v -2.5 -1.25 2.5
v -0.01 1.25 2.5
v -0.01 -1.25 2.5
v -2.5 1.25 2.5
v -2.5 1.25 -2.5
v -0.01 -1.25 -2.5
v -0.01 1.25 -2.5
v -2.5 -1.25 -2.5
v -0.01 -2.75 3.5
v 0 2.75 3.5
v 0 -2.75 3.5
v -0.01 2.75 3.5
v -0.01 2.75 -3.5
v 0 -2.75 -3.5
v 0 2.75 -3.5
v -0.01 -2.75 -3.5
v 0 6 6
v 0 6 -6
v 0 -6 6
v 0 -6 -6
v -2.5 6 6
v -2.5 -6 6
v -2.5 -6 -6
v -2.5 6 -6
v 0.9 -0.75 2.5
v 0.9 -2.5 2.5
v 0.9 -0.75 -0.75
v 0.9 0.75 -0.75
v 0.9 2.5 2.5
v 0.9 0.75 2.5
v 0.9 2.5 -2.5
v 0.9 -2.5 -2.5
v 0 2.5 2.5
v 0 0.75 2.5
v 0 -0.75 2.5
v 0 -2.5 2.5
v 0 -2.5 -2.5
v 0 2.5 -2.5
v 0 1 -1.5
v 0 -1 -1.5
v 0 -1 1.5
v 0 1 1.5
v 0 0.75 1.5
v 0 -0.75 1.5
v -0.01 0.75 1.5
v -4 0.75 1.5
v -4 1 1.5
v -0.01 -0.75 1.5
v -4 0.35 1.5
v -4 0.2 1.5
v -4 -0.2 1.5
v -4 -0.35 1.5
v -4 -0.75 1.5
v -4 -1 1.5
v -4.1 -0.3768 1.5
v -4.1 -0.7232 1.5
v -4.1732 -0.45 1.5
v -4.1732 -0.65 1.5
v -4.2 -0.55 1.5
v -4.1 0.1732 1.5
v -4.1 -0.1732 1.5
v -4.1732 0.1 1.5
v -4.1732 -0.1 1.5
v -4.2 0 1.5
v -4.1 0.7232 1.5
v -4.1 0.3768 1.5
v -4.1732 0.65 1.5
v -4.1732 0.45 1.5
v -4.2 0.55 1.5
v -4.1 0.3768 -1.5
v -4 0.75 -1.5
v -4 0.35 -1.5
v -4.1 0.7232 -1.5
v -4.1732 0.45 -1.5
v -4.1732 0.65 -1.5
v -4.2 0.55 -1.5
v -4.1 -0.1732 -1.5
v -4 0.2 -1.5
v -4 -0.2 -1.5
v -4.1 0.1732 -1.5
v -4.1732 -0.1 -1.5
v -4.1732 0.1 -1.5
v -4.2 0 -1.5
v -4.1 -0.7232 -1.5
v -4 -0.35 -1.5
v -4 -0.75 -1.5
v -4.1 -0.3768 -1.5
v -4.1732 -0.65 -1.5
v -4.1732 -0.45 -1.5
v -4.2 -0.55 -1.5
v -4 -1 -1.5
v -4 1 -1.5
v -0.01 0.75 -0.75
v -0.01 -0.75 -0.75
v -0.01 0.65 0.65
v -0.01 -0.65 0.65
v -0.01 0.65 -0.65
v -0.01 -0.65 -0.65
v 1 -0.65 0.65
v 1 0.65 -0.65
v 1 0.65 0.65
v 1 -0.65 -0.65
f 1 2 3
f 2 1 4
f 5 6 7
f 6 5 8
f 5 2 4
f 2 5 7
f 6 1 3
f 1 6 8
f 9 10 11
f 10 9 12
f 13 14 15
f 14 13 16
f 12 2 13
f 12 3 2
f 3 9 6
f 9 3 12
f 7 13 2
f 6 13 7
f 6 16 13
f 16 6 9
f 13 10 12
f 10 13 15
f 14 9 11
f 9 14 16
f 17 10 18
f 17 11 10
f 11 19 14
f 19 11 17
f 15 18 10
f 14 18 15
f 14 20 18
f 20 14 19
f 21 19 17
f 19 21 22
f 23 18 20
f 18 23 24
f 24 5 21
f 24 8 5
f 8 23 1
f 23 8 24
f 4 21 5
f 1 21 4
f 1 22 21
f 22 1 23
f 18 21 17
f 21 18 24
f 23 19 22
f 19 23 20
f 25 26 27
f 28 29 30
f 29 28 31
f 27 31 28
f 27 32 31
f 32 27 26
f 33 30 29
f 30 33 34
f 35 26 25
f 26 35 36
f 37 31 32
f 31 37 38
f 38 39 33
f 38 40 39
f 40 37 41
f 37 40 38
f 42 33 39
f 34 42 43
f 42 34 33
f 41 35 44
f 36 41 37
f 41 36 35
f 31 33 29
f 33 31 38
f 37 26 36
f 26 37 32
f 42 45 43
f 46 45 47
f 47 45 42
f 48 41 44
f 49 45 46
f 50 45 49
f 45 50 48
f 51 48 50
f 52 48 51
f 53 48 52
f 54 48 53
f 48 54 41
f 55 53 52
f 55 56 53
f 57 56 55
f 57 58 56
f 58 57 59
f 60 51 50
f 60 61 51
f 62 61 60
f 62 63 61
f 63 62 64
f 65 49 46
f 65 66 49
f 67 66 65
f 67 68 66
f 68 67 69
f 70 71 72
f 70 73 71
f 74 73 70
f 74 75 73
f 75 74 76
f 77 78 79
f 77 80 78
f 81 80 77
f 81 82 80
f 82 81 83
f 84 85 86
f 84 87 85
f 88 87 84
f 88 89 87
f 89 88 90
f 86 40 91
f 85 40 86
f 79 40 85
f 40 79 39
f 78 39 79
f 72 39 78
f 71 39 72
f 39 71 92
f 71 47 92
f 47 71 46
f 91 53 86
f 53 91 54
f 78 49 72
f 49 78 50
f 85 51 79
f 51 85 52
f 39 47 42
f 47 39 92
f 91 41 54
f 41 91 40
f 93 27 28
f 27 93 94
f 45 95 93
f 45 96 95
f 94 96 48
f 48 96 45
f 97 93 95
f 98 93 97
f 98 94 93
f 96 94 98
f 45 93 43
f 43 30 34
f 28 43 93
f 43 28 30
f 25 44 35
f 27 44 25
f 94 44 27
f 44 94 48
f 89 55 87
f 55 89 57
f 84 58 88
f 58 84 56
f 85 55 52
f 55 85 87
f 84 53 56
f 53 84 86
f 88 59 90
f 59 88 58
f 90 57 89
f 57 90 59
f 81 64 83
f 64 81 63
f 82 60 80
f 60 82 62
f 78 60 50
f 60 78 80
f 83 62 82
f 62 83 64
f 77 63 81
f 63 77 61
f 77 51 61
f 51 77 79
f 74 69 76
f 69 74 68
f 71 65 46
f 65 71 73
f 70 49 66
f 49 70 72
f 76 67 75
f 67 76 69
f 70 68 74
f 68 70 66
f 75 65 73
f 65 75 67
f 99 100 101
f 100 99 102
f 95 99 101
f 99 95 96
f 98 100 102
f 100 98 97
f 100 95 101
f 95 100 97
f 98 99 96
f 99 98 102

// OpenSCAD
// Captive power-switch actuator slider for the Alps SSSS811101.
//
// The SSSS811101 is a low-profile SMD side slide switch (6.7 x 2.6 x 1.4 mm,
// 1.5 mm slide travel, ~1.1 mm-thick horizontal actuator). Its knob protrudes
// only ~0.6 mm past the board's WEST edge and sits low against the PCB, so
// through a 2.5 mm case wall it is recessed and unreachable by a finger. This
// part bridges the tiny recessed knob out to a finger/nail-accessible paddle.
//
// Mechanism: a printed slider rides in a shallow channel milled into the INNER
// face of the west wall. A PADDLE pokes out through a narrow window slot in the
// wall (finger side); a wider FLANGE stays inside the channel so the slider
// cannot fall out the window (captive). A SLOT in the flange straddles the
// switch knob, so sliding the paddle drives the switch. The slider is dropped
// into the channel at assembly and trapped when the bottom tray closes under
// the top shell.
//
// Local frame (matches the board, top-shell convention):
//   +x = EAST  (inward, toward the PCB / switch body)
//   -x = WEST  (outward, through the wall, toward the user)
//   +y = NORTH (toward the board's rear/back edge), slide axis is along y
//   +z = UP
//   Origin: on the board WEST edge (wall inner face), at the knob's Z center,
//           on the switch/opening N-S center line.
//
// FIRST PASS -- like the front snap lip in params.scad, the fit numbers below
// are meant to be tuned against a test print. Print the slider flat (flange on
// the bed, slot facing up) so no support is needed in the knob slot.

// ---- Alps SSSS811101 facts (mirror ergogen/config.yaml + datasheet) --------
psa_wall_thickness = 2.5;   // case wall (mirror params.scad wall_thickness)
psa_travel         = 1.5;   // datasheet slide stroke
psa_knob_w         = 1.3;   // knob size along the slide axis (y), from footprint
psa_knob_proud     = 0.6;   // knob protrusion WEST past the board edge
psa_body_inset     = 1.0;   // switch body west face, EAST of board edge
                            // (= ergogen power_switch_west_clearance)

// ---- Fit clearances (TUNE against a test print) ----------------------------
psa_fit      = 0.25;  // general sliding clearance (paddle<->window, flange<->channel)
psa_grip_fit = 0.10;  // knob-slot clearance -- tighter; this drives the switch

// ---- Slider dimensions -----------------------------------------------------
psa_paddle_w   = 2.0;   // paddle width, y (along wall)
psa_paddle_h   = 3.0;   // paddle height, z
psa_paddle_out = 1.5;   // paddle protrusion past the OUTER wall face

psa_flange_w   = 5.0;   // flange width, y  (> window width => captive)
psa_flange_h   = 5.0;   // flange height, z
// Flange thickness (x) is capped so it clears the switch body west face.
psa_flange_t   = min(0.9, psa_body_inset - 0.1);

psa_fork_depth = psa_flange_t;                 // knob-slot depth into the flange (x)
psa_grip_relief = 0.4;                         // knob nub clearance west of the flange

$fn = 48;

// The slider (positive, printable / importable part).
module power_switch_actuator() {
    difference() {
        union() {
            // Flange: rides in the inner-wall channel, holds the slider captive.
            translate([0, -psa_flange_w/2, -psa_flange_h/2])
                cube([psa_flange_t, psa_flange_w, psa_flange_h]);

            // Paddle: through the wall window and proud of the outer face.
            translate([-(psa_wall_thickness + psa_paddle_out), -psa_paddle_w/2, -psa_paddle_h/2])
                cube([psa_wall_thickness + psa_paddle_out + 0.01, psa_paddle_w, psa_paddle_h]);
        }
        // Knob slot: straddles the switch knob (open toward the switch, +x).
        translate([-0.01, -(psa_knob_w + 2*psa_grip_fit)/2, -(psa_knob_w + 2*psa_grip_fit)/2])
            cube([psa_fork_depth + 0.02,
                  psa_knob_w + 2*psa_grip_fit,
                  psa_knob_w + 2*psa_grip_fit + 2]);  // tall slot; knob Z tolerant
    }
    // Vertical grip ridges across the paddle face (perpendicular to the
    // slide axis, so a fingernail catches them when you push the paddle).
    translate([-(psa_wall_thickness + psa_paddle_out), 0, 0])
        for (dy = [-0.55, 0, 0.55])
            translate([0, dy, 0])
                cylinder(h = psa_paddle_h, r = 0.2, center = true, $fn = 12);
}

// The NEGATIVE to subtract from a wall solid to form the window + channel.
// Subtract this from your wall (in the same local frame) to get a pocket the
// slider drops into. Window through the wall; channel is the wider inner recess.
module power_switch_actuator_cavity() {
    // Window slot through the wall (paddle passes through; tall enough for travel).
    translate([-(psa_wall_thickness + 0.5), -(psa_paddle_w + 2*psa_fit)/2,
               -(psa_paddle_h + psa_travel + 2*psa_fit)/2])
        cube([psa_wall_thickness + 1.0,
              psa_paddle_w + 2*psa_fit,
              psa_paddle_h + psa_travel + 2*psa_fit]);

    // Inner channel recess (captures the wider flange; limits travel via ends).
    translate([-0.01, -(psa_flange_w + 2*psa_fit)/2,
               -(psa_flange_h + psa_travel + 2*psa_fit)/2])
        cube([psa_flange_t + psa_fit,
              psa_flange_w + 2*psa_fit,
              psa_flange_h + psa_travel + 2*psa_fit]);
}

// ---- Demo: slider seated in a slice of wall, plus the switch knob ----------
module _psa_demo() {
    // Wall slice (west of x=0), with the cavity subtracted.
    color("Silver", 0.35)
    difference() {
        translate([-psa_wall_thickness, -6, -6]) cube([psa_wall_thickness, 12, 12]);
        power_switch_actuator_cavity();
    }
    // Switch knob nub (what we grip), east of / across x=0.
    color("Gold")
        translate([-psa_knob_proud, -psa_knob_w/2, -psa_knob_w/2])
            cube([psa_knob_proud + psa_body_inset, psa_knob_w, psa_knob_w]);
    // Slider.
    color("SteelBlue") power_switch_actuator();
}

_psa_demo();
